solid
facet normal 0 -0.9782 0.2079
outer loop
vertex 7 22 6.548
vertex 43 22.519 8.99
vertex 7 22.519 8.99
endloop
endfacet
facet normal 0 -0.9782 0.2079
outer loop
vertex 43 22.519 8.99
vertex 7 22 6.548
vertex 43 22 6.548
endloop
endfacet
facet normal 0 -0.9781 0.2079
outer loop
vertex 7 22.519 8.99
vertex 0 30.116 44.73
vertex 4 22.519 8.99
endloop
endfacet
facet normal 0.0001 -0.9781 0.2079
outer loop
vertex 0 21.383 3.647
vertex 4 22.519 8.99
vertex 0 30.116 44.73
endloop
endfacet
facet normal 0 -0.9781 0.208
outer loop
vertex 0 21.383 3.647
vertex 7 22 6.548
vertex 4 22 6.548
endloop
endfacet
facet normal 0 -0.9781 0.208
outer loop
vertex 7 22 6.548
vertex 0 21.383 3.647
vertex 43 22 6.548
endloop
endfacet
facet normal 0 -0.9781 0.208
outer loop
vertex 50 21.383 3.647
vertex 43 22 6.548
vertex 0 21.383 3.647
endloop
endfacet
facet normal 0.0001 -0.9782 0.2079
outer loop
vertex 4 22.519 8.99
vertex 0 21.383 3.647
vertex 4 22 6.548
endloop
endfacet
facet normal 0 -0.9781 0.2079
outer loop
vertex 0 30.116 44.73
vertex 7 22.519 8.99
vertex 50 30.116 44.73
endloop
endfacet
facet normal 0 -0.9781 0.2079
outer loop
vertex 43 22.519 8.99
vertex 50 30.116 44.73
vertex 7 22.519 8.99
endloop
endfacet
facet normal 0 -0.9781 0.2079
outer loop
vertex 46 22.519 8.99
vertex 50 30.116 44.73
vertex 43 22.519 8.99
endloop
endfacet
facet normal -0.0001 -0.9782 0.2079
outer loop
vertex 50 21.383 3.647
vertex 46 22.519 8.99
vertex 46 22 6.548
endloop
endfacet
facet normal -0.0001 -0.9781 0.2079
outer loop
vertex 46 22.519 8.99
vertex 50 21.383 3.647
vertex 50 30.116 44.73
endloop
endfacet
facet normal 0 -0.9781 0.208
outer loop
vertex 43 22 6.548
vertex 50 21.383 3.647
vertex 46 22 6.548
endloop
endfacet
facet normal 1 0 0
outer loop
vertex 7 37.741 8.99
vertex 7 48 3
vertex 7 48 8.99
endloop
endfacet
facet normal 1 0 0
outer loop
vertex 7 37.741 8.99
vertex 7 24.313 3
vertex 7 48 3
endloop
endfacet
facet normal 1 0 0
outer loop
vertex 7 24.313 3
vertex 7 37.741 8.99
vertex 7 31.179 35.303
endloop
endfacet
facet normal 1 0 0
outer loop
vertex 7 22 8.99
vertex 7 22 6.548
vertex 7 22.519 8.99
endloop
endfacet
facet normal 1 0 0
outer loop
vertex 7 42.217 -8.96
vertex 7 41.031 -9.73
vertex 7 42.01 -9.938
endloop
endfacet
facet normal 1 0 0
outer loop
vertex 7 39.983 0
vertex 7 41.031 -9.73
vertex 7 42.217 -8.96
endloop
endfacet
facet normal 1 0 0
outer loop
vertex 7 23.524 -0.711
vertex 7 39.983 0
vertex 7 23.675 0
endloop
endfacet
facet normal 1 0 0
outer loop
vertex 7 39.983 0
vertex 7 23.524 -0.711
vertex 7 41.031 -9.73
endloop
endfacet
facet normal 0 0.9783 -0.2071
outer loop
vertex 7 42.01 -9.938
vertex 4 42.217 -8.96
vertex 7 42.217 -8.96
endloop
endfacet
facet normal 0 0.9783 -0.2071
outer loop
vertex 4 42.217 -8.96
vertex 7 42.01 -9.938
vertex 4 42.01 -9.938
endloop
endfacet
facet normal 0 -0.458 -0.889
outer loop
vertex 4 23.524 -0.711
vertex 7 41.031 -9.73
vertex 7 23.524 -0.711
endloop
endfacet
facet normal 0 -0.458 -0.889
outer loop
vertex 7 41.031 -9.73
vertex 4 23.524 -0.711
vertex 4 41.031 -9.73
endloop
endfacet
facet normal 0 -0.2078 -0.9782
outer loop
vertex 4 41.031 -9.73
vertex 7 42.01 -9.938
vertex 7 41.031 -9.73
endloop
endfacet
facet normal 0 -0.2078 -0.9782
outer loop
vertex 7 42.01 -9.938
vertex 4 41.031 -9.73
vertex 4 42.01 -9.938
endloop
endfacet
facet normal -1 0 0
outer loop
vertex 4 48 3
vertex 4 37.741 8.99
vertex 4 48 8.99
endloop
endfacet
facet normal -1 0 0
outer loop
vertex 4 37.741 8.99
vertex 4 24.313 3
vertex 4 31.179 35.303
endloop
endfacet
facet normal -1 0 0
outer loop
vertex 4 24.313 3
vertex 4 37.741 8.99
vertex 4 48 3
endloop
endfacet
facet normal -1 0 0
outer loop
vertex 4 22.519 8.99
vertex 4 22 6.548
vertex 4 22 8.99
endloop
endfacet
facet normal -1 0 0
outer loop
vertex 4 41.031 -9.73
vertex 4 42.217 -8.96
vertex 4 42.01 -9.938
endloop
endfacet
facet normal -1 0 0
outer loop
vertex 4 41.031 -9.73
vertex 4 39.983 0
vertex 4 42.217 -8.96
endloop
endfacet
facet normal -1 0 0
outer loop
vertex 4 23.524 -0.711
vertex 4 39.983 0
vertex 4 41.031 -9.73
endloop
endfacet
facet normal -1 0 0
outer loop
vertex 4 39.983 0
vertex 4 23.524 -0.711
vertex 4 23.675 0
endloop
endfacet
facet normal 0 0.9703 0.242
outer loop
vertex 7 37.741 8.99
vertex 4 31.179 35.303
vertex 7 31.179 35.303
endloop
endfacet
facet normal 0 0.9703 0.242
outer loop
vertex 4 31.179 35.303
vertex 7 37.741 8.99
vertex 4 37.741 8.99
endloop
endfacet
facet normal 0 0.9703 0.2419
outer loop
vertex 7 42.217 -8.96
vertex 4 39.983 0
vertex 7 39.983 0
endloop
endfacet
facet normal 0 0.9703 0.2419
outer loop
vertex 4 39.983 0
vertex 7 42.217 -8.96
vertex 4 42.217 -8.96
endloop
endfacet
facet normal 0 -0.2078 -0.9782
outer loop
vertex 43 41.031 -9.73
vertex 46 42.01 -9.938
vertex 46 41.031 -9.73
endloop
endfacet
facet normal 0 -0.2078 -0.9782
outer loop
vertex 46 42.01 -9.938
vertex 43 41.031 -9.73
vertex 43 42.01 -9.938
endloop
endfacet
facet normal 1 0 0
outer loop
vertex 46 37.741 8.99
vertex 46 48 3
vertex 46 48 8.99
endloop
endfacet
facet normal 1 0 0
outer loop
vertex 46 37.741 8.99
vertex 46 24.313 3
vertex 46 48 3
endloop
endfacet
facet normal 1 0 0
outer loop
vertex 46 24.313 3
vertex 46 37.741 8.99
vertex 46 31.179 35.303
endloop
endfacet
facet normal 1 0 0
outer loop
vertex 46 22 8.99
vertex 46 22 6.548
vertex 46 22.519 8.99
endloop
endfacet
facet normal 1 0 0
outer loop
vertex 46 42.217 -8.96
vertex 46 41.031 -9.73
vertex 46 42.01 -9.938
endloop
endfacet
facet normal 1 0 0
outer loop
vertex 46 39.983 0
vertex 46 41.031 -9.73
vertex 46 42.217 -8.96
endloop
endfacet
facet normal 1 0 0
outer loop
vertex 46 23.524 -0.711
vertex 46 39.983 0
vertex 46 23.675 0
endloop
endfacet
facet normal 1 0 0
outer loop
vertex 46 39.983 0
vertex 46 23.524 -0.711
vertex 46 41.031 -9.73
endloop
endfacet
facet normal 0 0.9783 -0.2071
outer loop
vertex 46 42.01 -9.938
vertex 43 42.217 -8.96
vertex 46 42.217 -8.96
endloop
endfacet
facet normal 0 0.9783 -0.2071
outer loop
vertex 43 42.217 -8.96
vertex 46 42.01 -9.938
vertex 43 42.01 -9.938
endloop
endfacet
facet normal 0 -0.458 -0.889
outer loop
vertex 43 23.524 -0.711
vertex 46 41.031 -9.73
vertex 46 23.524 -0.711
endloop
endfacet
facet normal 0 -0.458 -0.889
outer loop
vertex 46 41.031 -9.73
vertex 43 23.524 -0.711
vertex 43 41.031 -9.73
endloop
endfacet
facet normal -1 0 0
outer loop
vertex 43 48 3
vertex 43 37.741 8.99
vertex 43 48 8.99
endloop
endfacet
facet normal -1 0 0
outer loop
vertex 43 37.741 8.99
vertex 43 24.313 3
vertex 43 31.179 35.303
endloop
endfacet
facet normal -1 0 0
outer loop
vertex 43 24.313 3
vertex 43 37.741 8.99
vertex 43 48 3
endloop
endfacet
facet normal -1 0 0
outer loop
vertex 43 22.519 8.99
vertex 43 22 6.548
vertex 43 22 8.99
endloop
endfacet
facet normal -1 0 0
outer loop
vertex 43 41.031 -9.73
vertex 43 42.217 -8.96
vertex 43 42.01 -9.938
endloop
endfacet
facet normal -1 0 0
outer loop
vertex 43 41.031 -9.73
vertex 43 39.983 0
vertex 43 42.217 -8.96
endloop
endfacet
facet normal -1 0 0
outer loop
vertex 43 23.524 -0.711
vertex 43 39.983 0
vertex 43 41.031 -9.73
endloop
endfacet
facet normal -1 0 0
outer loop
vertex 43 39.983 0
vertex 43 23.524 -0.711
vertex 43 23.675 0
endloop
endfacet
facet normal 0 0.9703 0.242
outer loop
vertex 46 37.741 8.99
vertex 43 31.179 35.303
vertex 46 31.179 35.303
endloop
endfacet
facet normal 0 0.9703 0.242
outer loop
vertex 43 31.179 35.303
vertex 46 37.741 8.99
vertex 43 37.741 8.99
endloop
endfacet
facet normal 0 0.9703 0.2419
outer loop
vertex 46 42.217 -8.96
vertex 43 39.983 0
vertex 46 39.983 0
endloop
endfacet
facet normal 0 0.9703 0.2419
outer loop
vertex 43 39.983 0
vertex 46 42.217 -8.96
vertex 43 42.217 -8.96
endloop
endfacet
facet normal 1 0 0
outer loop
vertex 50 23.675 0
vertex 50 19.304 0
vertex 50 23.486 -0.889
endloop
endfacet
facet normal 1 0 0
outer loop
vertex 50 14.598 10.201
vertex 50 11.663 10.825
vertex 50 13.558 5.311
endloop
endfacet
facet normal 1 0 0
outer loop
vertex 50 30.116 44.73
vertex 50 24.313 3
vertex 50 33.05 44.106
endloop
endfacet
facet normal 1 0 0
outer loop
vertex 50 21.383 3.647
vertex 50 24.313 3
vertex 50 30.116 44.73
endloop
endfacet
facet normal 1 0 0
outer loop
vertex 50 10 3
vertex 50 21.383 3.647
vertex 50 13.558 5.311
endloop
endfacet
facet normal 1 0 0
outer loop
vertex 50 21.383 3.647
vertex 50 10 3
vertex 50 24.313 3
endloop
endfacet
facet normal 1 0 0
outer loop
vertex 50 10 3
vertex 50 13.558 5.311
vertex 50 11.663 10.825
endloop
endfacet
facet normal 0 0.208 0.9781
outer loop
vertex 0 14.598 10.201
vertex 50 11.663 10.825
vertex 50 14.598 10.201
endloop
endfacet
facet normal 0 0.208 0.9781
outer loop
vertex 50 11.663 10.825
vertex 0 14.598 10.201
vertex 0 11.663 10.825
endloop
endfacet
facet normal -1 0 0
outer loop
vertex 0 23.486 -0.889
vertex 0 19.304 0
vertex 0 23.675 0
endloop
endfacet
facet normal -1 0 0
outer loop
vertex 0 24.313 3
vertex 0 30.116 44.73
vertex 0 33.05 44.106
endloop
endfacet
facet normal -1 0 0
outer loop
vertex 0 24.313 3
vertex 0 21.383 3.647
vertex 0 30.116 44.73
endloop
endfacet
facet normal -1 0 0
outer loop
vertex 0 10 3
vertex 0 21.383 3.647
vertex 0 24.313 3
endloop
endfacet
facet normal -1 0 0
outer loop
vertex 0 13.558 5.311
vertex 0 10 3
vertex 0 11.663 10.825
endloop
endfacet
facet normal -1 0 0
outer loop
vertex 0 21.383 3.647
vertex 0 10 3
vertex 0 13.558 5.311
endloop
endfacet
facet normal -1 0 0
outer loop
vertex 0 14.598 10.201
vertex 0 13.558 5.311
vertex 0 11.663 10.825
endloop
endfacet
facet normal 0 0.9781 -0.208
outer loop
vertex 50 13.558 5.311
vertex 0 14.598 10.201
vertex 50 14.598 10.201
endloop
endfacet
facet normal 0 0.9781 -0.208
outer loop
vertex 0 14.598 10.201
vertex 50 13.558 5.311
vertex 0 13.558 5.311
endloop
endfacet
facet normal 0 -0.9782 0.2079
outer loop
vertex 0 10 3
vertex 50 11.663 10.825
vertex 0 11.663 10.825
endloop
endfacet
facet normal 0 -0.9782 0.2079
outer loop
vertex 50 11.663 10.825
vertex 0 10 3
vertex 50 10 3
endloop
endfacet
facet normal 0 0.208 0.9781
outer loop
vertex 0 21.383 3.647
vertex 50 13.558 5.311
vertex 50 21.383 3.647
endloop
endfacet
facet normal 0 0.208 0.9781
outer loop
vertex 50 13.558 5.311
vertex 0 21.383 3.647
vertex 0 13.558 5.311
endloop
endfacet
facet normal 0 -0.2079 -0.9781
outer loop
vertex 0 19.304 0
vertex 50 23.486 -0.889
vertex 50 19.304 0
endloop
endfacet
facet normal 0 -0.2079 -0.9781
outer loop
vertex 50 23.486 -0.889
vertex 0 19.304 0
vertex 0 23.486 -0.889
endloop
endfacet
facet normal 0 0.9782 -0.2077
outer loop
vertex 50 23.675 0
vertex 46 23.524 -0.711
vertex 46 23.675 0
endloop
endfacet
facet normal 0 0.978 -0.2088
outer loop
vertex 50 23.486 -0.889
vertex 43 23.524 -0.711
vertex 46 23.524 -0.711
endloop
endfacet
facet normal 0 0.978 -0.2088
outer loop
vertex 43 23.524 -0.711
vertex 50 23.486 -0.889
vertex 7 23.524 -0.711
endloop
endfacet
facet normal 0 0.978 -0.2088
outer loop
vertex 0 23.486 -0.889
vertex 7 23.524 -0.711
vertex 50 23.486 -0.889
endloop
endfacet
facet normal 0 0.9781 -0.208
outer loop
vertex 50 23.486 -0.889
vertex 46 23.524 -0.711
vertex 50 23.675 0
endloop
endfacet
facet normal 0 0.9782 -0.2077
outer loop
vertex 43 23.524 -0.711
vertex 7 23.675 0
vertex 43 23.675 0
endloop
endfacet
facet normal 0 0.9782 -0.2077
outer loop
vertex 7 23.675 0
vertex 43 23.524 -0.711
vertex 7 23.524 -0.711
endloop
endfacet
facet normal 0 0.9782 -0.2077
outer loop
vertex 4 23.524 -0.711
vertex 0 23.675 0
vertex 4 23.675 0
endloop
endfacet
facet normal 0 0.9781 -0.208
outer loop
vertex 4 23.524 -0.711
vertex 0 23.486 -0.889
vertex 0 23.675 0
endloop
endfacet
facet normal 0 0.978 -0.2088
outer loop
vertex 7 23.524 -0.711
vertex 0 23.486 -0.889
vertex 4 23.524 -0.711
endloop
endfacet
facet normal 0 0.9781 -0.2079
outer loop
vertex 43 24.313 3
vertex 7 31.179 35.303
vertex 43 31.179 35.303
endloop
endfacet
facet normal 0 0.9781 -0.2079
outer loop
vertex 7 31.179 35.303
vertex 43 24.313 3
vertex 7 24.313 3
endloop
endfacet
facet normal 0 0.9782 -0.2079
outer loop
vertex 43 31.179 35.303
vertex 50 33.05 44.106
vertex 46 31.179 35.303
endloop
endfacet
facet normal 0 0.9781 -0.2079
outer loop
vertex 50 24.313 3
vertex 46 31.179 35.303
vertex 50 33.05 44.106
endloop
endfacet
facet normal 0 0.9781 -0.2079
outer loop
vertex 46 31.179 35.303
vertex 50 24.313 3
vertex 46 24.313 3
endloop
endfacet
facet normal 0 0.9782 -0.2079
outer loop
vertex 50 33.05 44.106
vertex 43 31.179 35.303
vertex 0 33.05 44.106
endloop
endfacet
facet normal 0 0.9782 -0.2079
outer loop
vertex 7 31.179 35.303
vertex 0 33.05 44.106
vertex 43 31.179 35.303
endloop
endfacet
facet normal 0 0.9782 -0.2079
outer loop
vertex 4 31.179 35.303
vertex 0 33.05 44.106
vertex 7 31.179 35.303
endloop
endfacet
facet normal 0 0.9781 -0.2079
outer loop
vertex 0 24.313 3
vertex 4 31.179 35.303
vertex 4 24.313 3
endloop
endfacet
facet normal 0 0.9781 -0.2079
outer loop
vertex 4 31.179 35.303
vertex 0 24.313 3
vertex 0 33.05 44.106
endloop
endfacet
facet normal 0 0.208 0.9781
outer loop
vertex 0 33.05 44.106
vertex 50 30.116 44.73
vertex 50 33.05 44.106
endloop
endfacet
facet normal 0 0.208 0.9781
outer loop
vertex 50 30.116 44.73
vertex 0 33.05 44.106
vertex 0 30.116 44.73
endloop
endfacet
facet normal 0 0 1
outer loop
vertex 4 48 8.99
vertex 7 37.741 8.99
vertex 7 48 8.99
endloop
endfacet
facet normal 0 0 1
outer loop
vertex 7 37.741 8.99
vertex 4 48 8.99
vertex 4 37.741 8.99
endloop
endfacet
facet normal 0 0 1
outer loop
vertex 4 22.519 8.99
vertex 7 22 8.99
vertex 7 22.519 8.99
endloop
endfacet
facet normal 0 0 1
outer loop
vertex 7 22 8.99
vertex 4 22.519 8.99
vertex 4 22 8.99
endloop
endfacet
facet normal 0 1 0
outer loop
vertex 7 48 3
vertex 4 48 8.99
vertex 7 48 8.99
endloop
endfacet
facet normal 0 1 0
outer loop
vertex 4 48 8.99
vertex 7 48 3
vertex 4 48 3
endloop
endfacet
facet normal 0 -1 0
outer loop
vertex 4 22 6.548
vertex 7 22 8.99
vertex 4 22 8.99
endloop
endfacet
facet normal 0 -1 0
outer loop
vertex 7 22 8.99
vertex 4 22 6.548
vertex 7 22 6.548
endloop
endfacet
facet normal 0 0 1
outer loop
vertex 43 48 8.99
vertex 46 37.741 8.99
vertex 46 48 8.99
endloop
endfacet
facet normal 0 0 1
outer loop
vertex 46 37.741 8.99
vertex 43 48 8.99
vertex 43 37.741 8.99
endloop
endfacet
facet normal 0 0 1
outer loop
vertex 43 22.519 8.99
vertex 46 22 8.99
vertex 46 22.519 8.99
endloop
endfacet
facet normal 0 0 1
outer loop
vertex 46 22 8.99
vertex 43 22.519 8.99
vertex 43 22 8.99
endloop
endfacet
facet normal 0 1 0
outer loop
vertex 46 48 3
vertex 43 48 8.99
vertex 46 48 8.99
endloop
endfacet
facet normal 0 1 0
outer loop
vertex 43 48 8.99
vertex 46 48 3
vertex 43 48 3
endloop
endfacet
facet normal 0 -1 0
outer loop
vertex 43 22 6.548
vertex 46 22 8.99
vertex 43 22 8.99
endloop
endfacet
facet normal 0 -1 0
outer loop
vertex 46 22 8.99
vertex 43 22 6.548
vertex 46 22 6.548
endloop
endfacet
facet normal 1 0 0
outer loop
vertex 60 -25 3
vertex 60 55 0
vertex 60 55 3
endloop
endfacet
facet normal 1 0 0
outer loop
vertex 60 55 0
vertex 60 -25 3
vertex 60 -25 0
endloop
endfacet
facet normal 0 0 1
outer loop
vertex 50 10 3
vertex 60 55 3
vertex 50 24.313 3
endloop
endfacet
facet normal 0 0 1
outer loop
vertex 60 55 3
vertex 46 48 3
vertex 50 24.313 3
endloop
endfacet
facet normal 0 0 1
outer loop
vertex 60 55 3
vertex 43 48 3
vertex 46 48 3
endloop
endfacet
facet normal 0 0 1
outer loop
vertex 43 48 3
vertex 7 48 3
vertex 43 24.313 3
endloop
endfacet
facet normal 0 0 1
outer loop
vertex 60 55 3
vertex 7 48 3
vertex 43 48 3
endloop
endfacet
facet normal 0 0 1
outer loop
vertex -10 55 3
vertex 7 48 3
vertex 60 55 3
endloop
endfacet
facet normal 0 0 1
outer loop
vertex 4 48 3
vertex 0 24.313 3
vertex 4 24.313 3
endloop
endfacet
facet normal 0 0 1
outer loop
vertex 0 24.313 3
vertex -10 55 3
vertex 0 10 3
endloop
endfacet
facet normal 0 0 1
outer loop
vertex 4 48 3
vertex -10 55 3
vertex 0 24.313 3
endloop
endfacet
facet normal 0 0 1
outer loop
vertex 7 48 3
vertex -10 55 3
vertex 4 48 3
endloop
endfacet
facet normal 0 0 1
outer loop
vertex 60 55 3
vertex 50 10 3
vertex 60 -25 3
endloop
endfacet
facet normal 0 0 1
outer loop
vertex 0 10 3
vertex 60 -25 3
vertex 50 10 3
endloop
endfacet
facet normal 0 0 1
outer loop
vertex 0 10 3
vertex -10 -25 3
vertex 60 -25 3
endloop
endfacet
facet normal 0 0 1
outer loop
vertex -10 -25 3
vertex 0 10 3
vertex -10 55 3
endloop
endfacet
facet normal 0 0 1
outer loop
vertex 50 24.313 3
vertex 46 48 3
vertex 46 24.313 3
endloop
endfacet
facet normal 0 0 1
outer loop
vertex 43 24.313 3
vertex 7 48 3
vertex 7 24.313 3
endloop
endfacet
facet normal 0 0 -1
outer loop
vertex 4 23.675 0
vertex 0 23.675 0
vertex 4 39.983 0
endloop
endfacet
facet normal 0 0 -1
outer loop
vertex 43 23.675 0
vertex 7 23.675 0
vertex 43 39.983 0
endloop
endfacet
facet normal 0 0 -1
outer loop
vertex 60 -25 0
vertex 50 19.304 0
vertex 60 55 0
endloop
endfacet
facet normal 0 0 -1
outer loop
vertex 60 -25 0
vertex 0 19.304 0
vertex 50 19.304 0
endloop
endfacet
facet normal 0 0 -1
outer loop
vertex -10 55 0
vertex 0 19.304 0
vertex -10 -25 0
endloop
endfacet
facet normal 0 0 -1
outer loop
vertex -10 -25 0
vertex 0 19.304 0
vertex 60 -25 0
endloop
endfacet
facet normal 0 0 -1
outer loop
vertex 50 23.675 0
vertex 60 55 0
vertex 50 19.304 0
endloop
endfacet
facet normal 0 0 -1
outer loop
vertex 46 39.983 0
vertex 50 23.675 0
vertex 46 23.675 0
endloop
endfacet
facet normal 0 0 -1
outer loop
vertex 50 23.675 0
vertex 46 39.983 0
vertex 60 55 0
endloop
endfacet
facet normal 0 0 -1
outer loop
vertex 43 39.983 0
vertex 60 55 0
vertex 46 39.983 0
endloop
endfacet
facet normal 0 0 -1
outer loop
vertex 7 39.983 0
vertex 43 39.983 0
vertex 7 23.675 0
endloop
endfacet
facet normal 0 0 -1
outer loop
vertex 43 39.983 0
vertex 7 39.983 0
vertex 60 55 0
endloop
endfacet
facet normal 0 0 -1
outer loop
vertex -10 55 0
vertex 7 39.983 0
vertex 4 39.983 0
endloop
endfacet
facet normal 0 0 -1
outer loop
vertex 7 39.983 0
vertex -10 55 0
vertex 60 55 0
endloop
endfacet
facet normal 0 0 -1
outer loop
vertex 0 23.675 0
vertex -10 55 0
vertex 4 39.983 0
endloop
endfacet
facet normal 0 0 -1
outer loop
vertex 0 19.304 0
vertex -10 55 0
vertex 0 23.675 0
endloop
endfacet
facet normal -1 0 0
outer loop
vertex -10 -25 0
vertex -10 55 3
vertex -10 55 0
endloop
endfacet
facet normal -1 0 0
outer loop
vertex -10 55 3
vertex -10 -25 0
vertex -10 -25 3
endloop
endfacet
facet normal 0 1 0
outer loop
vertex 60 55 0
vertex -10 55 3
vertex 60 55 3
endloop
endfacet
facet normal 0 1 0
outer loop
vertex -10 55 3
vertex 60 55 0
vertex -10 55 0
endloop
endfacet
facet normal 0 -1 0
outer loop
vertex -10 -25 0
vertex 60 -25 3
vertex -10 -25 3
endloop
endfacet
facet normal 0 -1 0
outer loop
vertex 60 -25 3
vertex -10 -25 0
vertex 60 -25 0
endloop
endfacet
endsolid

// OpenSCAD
// SkyStation - suporte de bancada p/ TESTE da tela 14" (v0.1)
// 2 pes que seguram o painel nu em pe + 1 presilha de alivio do cabo eDP.
// Ranhura larga (8 mm) forrada com EVA/fita dupla-face espuma: serve p/ paineis de 3 a 6 mm.
PART = "pe";       // pe | presilha | conjunto
$fn = 40;
slot  = 8;         // largura da ranhura (painel + espuma)
tilt  = 12;        // inclinacao p/ tras
base  = [70, 80, 3];
front = 8;         // altura da aba da frente (cobre pouco da tela)
back  = 45;        // altura do encosto traseiro
wl    = 3;         // espessura das paredes
len   = 50;        // comprimento do pe (ao longo da borda da tela)

module pe(){
  // base
  translate([-base[0]/2+len/2, -25, 0]) cube(base);
  // berco inclinado
  translate([0, 10, base[2]]) rotate([-tilt,0,0]) {
    cube([len, wl, front]);                                 // aba frontal
    translate([0, 0, -1]) cube([len, wl*2+slot, wl+1]);     // fundo da ranhura
    translate([0, wl+slot, 0]) cube([len, wl, back]);       // encosto
    // nervuras do encosto
    for(x=[4, len-4-wl]) translate([x, wl+slot, 0]) hull(){
      cube([wl, wl, back*0.8]); translate([0, 22, -6]) cube([wl, 1, 1]); }
  }
  // reforco base->nervuras
  for(x=[4, len-4-wl]) translate([x, 10+wl*2+slot-2, base[2]-0.01]) cube([wl, 26, 6]);
}

module presilha(){ // cola no verso do painel (fita dupla-face) perto do conector
  difference(){
    cube([40, 22, 7]);
    translate([5, -1, 2.2]) cube([30, 24, 3.2]);   // canal do cabo (flat) 30 x 3.2
  }
}

if(PART=="pe") pe();
if(PART=="presilha") presilha();
if(PART=="conjunto"){
  pe(); translate([200,0,0]) pe();
  color("#0b0d12") translate([-70, 10+3+1.5, 3+3]) rotate([-tilt,0,0]) cube([340, 5, 200]);
}
